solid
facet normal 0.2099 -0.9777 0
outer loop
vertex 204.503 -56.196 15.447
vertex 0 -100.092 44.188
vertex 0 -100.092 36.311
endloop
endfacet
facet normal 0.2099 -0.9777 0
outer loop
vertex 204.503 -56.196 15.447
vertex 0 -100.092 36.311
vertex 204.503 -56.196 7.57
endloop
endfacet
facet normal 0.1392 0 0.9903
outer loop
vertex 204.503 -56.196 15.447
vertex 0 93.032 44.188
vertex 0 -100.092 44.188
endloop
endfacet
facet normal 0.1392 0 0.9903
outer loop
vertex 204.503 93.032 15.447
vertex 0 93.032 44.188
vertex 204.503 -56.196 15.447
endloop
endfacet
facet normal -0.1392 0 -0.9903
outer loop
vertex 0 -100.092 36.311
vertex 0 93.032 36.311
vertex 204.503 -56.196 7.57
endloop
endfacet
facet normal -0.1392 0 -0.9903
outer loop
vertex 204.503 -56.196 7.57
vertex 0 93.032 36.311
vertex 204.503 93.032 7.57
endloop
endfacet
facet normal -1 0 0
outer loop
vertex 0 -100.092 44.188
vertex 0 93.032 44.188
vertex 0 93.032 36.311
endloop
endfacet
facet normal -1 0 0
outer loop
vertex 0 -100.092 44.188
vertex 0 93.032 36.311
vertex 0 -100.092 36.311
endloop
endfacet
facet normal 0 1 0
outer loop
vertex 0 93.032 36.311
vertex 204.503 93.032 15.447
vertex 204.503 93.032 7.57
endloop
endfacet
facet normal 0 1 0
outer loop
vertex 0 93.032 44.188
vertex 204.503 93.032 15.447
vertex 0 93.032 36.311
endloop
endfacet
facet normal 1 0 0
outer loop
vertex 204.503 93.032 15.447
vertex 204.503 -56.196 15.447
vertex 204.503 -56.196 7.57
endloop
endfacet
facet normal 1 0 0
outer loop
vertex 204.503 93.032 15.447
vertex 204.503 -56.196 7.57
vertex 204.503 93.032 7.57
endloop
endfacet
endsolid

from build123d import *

# Parameters (mm, degrees)
SKETCH006_AS_DRAWN_W                      = 457.2
SKETCH006_AS_DRAWN_H                      = 304.8
EXTRUDE005_DEPTH                          = 7.8
EXTRUDE005_ONTO_SKETCH006_PLACEMENT_ANGLE = 8
EXTRUDE004_DEPTH                          = 152.4


with BuildPart() as hole_depth:
    # Sketch006 as drawn → Extrude005 (new)
    with BuildSketch(Plane.XY):
        Rectangle(SKETCH006_AS_DRAWN_W, SKETCH006_AS_DRAWN_H)
    extrude(amount=-EXTRUDE005_DEPTH)


with BuildPart() as hole_depth_1:
    # Extrude005 onto Sketch006 placement: moved
    add(hole_depth.part.moved(Location((41.07289, 0, 38.415507))).rotate(Axis((41.07289, 0, 38.415507), (0, 1, 0)), EXTRUDE005_ONTO_SKETCH006_PLACEMENT_ANGLE))


with BuildPart() as shallow_hole_volume:
    # Sketch005 → Extrude004 (new body, symmetric)
    with BuildSketch(Plane.XY):
        Polygon((0, 93.031891), (0, -100.091701), (204.503499, -56.19595), (204.503499, 93.031891), align=None)
    extrude(amount=EXTRUDE004_DEPTH, both=True)

    # Common: intersect Hole Depth
    add(hole_depth_1.part, mode=Mode.INTERSECT)


solid = shallow_hole_volume.part
